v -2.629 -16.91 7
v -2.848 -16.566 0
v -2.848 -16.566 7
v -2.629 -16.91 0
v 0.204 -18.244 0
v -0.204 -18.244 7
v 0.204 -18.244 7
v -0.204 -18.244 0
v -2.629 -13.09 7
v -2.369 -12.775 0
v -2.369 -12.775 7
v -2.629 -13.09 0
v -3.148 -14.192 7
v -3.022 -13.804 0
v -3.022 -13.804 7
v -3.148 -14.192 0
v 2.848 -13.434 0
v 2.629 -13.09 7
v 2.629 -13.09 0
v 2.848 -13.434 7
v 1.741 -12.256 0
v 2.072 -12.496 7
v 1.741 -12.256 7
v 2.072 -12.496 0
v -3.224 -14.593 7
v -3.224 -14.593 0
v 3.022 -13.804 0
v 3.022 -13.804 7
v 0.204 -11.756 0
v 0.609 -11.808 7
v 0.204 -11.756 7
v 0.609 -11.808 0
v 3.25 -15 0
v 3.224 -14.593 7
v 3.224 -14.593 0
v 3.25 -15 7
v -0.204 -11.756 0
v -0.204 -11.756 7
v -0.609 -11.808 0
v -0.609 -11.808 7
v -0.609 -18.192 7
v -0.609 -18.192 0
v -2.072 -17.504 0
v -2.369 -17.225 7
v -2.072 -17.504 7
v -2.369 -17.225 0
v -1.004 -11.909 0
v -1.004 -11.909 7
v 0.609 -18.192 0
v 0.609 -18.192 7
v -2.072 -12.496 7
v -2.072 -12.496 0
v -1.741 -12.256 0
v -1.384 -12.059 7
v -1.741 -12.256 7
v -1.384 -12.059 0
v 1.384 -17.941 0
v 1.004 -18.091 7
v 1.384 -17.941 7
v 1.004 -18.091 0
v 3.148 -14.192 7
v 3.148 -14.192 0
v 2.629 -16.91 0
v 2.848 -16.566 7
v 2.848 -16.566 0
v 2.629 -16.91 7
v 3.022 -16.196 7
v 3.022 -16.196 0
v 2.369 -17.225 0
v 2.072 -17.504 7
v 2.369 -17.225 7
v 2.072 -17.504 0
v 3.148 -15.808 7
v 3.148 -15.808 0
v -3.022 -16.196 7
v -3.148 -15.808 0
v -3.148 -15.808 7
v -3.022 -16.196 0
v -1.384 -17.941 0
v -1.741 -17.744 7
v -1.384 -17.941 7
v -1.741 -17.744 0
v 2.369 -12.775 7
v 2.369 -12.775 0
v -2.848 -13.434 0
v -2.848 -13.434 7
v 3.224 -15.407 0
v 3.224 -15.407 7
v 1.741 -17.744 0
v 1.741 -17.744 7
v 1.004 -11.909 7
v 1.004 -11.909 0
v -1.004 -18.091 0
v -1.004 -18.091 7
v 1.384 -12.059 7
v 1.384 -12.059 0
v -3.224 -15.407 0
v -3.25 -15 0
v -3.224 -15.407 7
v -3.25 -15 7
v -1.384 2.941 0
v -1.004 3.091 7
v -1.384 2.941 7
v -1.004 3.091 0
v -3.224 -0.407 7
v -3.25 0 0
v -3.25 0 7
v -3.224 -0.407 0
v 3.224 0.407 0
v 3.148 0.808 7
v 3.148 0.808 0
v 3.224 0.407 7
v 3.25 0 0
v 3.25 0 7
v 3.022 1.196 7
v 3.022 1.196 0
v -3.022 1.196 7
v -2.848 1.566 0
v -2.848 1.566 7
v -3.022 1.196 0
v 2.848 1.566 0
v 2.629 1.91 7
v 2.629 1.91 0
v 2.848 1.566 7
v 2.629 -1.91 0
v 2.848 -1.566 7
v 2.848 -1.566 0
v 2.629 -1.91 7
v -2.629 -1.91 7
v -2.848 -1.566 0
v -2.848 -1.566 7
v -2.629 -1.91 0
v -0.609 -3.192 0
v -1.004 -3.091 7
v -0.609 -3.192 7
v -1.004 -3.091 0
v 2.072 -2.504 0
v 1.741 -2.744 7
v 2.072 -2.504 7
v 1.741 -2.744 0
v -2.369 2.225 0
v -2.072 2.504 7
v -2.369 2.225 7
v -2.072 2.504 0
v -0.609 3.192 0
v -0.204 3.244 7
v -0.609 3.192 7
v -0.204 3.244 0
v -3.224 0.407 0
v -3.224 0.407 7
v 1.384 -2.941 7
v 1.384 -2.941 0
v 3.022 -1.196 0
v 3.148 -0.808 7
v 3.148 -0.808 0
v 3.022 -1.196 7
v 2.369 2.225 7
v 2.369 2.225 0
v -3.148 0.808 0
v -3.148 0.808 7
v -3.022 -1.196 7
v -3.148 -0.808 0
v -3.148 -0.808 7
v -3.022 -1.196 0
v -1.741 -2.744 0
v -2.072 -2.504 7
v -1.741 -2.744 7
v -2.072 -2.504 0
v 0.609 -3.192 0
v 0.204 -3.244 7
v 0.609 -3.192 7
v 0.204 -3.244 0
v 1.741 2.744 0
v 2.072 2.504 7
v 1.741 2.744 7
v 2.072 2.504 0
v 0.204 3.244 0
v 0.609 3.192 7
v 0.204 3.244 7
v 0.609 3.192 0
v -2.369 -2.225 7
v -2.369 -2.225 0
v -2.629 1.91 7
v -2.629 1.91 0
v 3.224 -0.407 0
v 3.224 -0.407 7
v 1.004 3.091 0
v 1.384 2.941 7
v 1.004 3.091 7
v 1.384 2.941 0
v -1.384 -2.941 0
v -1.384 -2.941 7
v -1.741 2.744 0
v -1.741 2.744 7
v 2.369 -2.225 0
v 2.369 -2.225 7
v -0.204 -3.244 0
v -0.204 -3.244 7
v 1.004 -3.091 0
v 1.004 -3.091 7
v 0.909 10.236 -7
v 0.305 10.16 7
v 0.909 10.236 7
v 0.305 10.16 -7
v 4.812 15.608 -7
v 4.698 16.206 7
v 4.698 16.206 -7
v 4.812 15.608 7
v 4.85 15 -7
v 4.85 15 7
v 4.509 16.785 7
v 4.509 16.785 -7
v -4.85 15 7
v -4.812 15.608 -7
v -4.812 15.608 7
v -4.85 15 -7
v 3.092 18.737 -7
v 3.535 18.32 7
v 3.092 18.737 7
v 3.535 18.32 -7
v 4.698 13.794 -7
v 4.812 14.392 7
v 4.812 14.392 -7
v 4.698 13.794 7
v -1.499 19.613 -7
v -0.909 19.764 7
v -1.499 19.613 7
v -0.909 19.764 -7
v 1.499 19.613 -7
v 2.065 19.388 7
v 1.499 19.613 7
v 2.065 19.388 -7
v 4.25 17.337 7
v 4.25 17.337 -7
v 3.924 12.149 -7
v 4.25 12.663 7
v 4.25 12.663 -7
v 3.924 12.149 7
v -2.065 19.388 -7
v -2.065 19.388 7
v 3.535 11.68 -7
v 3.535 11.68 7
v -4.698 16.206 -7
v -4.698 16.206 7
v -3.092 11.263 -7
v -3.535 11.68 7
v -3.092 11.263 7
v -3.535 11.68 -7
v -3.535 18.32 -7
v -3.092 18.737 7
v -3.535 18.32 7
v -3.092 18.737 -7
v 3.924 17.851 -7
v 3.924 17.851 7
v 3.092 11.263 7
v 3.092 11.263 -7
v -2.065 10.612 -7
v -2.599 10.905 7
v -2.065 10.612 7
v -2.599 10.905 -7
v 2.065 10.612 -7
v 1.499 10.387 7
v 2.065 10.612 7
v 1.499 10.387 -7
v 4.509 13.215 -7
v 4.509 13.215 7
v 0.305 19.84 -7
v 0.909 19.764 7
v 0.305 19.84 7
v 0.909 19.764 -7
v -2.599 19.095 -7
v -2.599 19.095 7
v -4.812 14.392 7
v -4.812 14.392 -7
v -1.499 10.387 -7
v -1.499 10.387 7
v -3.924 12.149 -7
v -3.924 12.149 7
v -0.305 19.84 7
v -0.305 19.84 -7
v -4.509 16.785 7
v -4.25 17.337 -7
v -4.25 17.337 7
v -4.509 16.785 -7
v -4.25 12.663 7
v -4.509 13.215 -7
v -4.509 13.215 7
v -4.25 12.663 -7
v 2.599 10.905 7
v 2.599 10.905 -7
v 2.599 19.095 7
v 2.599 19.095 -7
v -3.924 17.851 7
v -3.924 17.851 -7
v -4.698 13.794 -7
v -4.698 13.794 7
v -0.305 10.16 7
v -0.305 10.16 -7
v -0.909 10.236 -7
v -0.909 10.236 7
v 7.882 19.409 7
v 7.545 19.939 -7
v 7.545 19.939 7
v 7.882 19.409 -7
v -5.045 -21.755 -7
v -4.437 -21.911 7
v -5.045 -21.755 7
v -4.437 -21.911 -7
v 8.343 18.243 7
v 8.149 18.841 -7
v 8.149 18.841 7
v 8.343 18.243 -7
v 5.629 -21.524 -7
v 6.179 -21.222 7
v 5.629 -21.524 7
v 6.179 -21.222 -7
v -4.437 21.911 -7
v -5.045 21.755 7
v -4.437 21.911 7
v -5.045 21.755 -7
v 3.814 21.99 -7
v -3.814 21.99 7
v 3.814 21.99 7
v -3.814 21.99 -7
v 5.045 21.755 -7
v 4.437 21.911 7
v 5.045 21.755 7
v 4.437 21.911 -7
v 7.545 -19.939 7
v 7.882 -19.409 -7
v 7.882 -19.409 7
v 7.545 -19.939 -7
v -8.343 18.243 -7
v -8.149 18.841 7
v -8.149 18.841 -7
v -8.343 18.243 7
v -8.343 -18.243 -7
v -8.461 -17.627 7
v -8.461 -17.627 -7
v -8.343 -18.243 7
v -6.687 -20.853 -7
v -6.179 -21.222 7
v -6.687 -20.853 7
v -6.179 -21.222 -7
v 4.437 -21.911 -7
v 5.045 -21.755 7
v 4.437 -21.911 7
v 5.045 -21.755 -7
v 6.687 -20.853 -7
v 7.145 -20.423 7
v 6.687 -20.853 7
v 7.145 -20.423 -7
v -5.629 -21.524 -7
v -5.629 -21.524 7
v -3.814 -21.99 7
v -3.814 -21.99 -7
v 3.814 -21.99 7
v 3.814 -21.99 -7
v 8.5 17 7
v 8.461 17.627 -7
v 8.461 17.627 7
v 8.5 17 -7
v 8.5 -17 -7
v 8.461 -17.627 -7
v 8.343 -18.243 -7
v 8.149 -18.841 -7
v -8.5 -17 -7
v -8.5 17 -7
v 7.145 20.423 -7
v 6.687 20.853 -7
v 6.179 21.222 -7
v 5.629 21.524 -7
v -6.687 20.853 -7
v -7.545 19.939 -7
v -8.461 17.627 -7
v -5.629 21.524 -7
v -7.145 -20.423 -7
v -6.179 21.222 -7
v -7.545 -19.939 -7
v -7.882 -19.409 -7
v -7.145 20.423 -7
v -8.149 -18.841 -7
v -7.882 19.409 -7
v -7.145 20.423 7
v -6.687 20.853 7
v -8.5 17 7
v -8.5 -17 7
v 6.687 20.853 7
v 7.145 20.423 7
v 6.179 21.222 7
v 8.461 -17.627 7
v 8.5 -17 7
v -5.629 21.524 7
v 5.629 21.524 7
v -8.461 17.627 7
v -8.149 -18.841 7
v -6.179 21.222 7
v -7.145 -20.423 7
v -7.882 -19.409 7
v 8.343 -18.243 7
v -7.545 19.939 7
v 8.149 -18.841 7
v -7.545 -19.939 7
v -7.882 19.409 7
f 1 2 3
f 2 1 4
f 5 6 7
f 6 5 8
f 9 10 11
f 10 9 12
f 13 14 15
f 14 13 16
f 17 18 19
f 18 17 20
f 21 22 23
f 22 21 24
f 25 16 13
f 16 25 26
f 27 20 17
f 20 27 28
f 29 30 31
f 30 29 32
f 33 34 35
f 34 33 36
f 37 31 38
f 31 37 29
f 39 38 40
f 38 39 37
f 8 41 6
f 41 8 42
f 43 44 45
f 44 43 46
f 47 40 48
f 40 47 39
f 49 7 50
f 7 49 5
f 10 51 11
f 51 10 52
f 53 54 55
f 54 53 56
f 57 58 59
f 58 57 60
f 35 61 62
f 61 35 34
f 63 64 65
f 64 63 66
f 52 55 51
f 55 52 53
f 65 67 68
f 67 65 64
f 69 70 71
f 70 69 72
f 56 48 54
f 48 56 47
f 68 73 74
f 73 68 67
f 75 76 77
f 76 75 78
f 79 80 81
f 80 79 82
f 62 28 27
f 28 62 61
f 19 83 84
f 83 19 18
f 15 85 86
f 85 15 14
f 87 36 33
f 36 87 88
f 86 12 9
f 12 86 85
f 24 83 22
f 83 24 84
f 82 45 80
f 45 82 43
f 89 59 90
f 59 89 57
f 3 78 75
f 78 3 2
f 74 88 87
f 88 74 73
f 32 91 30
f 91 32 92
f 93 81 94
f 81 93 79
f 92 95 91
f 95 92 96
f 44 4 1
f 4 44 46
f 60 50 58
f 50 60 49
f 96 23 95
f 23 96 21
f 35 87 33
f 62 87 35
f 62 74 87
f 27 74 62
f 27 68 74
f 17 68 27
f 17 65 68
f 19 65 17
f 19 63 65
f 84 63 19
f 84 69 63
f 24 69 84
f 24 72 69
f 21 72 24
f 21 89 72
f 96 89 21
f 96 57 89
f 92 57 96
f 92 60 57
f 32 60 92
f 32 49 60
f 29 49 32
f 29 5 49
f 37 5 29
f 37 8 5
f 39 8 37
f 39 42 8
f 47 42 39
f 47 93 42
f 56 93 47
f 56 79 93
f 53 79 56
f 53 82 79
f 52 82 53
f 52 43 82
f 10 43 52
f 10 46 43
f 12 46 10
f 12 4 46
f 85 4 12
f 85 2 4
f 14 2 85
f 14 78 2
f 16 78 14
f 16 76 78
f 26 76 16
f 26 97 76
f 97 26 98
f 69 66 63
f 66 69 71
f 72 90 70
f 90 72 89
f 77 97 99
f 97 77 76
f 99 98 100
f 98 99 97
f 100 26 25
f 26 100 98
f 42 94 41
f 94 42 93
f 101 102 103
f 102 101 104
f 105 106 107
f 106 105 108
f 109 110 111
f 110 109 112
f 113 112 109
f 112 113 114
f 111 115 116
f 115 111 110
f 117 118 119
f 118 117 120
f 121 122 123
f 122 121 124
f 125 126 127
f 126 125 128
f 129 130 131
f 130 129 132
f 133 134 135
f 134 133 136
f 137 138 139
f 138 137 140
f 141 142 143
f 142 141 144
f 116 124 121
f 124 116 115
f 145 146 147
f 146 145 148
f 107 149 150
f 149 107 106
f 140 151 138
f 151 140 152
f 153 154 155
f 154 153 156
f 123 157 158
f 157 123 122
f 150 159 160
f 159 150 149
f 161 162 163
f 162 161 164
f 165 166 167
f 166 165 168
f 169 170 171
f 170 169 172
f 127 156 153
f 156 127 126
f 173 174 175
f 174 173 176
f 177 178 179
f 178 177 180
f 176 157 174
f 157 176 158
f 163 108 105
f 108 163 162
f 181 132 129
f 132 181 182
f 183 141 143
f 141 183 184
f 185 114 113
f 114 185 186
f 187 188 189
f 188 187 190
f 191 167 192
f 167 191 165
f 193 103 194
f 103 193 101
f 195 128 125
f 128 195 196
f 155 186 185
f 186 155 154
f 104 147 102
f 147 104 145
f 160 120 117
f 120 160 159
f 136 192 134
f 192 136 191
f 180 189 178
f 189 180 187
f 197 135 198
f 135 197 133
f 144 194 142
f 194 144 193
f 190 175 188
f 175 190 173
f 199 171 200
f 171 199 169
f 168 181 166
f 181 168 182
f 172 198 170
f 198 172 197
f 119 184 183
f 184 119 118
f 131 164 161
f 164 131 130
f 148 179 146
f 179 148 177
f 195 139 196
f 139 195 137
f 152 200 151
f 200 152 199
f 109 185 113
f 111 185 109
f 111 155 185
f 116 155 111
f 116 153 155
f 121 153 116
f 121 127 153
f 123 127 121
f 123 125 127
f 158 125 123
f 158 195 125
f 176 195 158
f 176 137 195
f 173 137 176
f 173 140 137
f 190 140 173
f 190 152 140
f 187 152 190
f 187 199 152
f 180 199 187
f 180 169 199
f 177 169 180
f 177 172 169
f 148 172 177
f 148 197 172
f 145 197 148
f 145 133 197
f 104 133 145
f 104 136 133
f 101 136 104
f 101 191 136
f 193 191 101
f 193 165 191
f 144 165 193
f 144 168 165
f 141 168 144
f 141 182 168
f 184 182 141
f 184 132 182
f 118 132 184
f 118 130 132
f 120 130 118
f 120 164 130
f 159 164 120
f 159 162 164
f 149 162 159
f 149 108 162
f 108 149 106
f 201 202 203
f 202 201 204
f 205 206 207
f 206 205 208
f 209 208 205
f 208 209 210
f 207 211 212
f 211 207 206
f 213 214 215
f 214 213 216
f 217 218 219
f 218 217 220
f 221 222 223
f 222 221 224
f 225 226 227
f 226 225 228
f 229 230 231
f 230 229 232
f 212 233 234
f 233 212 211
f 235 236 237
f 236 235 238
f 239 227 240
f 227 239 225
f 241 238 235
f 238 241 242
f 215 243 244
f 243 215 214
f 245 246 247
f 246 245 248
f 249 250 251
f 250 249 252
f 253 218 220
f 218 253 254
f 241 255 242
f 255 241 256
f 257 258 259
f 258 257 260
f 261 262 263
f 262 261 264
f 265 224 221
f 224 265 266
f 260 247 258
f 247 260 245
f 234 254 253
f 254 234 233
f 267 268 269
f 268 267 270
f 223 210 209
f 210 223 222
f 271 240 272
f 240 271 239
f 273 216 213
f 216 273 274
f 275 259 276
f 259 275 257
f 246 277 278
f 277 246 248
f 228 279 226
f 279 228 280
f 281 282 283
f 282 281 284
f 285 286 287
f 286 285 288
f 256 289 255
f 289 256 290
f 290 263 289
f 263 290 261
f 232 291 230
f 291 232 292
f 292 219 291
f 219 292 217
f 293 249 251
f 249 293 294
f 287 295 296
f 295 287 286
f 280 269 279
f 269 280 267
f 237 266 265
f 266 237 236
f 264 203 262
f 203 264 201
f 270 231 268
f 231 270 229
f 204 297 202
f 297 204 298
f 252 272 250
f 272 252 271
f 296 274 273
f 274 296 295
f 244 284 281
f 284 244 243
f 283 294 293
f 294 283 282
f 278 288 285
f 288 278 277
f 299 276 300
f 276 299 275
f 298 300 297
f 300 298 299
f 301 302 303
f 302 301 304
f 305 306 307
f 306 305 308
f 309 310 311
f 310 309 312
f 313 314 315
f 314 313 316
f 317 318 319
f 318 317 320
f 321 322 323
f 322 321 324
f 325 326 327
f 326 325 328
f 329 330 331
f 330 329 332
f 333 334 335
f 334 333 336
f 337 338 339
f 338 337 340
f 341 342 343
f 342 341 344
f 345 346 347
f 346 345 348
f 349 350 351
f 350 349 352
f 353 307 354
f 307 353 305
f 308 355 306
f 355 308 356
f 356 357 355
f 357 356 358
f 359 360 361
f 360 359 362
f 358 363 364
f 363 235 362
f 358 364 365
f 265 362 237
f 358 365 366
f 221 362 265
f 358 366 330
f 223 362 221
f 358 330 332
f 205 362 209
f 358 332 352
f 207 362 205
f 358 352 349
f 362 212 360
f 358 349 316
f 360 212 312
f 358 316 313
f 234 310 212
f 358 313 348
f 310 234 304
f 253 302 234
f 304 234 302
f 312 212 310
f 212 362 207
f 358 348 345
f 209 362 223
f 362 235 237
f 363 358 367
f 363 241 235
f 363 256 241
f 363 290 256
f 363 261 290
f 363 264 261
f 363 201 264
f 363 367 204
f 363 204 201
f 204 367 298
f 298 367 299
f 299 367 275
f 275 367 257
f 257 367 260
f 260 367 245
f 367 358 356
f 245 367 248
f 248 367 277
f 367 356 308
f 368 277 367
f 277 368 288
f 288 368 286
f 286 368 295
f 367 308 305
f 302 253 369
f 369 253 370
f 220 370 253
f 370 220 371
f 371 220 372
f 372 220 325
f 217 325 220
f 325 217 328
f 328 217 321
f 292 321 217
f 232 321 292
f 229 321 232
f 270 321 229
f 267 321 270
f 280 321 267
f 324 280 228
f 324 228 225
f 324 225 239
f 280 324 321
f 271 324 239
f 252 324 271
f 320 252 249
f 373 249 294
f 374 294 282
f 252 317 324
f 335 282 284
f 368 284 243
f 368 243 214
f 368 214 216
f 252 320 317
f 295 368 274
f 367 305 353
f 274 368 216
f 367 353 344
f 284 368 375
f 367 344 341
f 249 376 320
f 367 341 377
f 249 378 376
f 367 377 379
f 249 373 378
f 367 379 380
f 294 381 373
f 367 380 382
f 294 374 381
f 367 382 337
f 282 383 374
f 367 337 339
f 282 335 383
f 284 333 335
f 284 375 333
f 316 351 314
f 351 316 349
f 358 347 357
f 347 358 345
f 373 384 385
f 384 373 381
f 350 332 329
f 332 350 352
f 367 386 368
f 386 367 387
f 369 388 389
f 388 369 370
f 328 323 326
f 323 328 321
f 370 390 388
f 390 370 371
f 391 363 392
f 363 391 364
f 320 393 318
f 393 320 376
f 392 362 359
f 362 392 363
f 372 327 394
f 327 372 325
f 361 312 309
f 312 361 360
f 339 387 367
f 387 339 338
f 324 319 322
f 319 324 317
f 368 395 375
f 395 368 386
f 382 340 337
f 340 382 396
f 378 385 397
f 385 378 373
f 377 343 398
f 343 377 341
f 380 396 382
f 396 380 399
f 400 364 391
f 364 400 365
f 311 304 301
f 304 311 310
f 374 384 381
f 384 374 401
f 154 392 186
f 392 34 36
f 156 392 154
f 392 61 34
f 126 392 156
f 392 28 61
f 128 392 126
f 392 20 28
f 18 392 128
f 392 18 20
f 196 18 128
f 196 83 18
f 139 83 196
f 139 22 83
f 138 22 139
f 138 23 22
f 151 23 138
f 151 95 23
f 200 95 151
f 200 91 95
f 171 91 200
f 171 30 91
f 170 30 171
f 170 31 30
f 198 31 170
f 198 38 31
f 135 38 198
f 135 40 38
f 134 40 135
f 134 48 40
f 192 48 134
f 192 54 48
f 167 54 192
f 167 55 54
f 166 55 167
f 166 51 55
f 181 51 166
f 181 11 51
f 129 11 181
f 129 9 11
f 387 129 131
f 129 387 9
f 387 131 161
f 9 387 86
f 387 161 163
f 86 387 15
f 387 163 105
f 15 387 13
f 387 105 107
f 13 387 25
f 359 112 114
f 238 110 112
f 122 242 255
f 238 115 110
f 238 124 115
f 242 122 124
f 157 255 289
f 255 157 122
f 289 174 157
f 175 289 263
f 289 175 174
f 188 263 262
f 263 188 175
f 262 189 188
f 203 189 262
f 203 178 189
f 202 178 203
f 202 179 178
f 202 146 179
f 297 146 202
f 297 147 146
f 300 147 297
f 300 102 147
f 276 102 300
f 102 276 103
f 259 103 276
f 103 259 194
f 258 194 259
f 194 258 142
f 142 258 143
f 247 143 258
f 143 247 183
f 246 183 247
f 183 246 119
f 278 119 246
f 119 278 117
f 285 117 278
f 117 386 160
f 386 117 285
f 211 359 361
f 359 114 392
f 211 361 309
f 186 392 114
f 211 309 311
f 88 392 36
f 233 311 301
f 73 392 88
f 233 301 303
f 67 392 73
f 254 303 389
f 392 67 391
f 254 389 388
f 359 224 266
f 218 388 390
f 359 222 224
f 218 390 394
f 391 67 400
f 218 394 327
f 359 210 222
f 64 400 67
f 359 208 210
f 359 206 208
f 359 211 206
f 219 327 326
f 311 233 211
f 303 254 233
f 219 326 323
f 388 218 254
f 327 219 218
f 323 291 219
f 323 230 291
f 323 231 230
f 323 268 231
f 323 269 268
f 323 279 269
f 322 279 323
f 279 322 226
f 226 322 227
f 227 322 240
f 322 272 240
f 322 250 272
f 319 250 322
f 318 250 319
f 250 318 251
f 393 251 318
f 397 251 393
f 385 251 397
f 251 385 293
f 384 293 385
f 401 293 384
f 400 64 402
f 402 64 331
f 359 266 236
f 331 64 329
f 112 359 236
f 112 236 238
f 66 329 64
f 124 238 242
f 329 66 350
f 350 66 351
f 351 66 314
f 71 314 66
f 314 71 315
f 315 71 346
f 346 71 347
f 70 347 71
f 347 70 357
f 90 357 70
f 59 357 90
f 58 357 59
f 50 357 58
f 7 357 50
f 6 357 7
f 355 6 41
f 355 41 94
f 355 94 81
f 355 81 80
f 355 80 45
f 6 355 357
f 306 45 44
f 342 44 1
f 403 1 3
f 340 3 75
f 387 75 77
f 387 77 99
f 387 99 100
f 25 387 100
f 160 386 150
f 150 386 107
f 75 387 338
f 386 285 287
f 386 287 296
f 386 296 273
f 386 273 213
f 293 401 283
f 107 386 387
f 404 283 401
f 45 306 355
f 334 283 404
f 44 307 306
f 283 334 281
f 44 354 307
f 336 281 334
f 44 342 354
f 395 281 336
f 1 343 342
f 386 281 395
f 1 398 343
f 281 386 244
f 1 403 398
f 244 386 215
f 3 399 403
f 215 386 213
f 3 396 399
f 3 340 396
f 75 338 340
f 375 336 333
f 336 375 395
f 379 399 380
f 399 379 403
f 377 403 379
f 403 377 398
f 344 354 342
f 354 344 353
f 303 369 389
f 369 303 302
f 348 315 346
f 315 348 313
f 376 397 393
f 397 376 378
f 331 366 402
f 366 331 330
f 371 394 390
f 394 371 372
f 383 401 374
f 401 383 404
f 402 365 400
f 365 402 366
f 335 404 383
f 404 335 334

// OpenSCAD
$fn = 50;


difference() {
	union() {
		translate(v = [0, 0, -7.0000000000]) {
			hull() {
				translate(v = [-3.5000000000, 17.0000000000, 0]) {
					cylinder(h = 14, r = 5);
				}
				translate(v = [3.5000000000, 17.0000000000, 0]) {
					cylinder(h = 14, r = 5);
				}
				translate(v = [-3.5000000000, -17.0000000000, 0]) {
					cylinder(h = 14, r = 5);
				}
				translate(v = [3.5000000000, -17.0000000000, 0]) {
					cylinder(h = 14, r = 5);
				}
			}
		}
	}
	union() {
		translate(v = [0.0000000000, -15.0000000000, 0]) {
			cylinder(h = 100, r = 3.2500000000);
		}
		cylinder(h = 100, r = 3.2500000000);
		translate(v = [0, 15, -100.0000000000]) {
			cylinder(h = 200, r = 4.8500000000);
		}
	}
}
